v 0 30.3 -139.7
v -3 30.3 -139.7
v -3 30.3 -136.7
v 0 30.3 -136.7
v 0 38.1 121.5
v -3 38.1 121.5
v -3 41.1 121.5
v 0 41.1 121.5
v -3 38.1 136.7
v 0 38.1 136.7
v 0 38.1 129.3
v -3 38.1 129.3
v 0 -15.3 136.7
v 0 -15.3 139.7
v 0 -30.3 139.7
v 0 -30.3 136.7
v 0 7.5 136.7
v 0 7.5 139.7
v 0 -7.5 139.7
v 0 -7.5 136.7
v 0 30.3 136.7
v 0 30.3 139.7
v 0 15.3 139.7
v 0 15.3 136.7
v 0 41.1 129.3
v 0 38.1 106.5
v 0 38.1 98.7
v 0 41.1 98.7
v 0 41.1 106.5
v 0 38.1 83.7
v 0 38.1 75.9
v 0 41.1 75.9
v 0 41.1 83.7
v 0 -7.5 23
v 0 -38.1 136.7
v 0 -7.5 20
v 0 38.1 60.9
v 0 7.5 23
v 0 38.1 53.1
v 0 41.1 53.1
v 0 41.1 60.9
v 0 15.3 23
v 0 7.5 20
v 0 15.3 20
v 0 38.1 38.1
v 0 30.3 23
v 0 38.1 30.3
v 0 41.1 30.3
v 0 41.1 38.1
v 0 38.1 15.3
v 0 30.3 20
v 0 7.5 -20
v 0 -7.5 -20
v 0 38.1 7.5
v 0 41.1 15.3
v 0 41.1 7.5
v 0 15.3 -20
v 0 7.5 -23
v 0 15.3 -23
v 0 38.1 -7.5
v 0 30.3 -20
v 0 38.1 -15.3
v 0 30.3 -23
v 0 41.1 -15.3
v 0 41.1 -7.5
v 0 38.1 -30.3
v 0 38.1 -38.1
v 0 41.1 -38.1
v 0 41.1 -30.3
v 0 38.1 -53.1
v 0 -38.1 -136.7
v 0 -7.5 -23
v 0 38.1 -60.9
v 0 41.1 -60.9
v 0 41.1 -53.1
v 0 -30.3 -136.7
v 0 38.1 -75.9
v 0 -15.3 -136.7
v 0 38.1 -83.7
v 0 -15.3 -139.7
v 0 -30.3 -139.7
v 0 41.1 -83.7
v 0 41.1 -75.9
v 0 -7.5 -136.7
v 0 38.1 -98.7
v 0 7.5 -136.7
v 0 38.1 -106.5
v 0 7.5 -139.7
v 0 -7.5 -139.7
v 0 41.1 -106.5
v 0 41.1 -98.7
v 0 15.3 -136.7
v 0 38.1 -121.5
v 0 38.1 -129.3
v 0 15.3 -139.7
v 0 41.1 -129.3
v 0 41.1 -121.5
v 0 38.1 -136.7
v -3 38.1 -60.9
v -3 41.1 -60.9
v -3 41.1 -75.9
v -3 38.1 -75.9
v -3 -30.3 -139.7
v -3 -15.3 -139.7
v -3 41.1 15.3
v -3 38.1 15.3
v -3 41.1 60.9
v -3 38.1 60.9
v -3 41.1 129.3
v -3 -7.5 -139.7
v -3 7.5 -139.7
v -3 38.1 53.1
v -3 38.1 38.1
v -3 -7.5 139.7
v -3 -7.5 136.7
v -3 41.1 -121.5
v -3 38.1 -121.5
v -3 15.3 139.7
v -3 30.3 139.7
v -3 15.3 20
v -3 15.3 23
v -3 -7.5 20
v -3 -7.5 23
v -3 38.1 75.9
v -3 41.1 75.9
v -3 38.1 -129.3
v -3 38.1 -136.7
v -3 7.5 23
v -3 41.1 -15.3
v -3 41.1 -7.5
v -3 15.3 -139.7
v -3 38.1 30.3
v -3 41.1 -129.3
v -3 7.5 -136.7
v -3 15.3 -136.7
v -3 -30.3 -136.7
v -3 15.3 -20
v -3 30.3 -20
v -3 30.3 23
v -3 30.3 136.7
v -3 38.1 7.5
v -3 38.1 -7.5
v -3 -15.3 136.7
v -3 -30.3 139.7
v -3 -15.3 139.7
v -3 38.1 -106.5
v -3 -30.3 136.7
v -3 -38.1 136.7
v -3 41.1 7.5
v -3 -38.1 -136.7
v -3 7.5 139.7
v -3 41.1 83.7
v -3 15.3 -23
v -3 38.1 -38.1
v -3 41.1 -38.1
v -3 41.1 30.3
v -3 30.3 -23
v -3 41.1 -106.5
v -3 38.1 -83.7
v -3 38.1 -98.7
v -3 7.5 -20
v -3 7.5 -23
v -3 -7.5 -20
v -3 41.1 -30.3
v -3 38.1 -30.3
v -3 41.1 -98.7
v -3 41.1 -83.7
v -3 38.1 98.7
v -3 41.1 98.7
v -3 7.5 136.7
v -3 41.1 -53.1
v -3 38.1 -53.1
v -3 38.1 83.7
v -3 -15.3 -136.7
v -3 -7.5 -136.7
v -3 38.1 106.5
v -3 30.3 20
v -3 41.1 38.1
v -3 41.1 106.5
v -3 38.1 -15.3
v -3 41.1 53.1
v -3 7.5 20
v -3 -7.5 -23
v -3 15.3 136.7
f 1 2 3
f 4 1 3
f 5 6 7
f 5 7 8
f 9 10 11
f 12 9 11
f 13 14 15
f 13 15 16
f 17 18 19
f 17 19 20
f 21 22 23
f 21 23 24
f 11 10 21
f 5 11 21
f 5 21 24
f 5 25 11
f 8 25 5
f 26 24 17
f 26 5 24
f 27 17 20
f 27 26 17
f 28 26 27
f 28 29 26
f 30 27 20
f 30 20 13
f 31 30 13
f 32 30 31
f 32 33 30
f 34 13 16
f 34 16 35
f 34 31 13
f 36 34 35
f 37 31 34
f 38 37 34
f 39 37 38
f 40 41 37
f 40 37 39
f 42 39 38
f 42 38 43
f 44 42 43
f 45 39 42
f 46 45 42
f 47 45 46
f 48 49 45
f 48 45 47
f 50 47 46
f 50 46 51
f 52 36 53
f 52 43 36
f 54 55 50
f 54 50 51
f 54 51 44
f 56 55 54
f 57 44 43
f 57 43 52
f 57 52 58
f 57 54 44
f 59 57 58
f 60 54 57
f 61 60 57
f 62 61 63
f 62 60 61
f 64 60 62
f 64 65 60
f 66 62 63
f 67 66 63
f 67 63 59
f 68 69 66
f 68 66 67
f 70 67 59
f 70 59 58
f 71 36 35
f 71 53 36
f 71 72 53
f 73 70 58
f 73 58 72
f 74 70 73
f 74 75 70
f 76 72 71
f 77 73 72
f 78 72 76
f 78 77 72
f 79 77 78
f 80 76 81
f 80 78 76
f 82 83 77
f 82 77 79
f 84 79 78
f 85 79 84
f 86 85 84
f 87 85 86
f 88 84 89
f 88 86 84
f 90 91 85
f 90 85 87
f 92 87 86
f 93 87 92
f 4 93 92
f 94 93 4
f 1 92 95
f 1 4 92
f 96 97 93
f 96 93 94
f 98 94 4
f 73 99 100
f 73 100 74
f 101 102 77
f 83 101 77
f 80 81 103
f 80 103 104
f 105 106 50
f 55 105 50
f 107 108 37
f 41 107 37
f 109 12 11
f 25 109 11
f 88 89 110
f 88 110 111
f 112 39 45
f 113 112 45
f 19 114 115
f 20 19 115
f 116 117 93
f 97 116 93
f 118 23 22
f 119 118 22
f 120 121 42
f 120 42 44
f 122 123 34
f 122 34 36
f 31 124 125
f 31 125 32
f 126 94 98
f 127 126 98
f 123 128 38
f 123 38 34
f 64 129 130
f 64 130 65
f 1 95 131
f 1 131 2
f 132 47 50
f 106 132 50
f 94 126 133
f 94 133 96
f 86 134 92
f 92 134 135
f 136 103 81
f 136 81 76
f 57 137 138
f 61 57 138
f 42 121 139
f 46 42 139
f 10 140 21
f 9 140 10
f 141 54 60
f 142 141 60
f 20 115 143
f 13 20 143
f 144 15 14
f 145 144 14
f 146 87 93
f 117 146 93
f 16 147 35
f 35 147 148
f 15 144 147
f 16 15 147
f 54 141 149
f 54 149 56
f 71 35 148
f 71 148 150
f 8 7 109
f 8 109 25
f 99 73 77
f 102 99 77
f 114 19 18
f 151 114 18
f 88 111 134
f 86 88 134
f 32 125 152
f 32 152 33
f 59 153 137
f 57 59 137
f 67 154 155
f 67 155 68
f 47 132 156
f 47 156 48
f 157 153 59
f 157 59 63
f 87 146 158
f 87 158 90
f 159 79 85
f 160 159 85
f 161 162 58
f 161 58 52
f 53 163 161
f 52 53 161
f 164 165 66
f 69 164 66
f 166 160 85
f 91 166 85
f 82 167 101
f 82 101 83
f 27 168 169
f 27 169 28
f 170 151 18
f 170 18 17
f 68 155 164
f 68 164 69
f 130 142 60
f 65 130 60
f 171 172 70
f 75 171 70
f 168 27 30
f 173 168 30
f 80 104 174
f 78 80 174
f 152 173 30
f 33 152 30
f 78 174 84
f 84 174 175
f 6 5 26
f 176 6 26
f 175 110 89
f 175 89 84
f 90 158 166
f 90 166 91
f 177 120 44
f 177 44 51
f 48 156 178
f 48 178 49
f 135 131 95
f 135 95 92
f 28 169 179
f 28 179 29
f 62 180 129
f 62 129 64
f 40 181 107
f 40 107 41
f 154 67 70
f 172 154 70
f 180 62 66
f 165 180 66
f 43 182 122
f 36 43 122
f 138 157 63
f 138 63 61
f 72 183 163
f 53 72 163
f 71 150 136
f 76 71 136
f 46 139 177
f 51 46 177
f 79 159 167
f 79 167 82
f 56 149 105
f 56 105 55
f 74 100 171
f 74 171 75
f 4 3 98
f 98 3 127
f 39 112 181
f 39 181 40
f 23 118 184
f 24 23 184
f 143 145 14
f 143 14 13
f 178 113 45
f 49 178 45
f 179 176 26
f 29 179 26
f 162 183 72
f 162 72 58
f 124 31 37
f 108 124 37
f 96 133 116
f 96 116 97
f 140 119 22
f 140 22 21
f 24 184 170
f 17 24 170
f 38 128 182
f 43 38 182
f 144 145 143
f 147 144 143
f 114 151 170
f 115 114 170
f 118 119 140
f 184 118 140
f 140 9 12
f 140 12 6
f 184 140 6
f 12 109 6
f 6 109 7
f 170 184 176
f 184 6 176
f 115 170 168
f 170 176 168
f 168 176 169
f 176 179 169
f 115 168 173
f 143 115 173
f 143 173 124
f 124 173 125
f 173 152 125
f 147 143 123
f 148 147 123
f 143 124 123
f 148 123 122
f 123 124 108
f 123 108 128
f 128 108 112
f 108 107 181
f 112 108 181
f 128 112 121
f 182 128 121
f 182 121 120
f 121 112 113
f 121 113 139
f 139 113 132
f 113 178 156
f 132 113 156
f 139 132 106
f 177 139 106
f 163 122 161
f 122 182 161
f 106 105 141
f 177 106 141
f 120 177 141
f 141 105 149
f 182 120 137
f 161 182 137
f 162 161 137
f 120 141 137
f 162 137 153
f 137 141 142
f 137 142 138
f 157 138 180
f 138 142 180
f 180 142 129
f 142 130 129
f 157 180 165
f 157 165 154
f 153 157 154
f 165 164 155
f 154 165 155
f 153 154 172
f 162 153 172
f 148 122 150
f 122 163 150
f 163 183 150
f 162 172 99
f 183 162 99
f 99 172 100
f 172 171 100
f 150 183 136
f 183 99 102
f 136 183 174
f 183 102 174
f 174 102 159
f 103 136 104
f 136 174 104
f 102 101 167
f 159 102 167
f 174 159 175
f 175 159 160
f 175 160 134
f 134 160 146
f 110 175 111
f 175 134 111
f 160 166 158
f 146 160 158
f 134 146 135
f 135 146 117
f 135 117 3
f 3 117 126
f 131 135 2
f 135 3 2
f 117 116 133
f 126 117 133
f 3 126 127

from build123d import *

# Parameters (mm, degrees)
SKETCH1_W               = 279.4
SKETCH1_H               = 76.2
BOSS_EXTRUDE1_DEPTH     = 3
SKETCH3_W               = 3
SKETCH3_H               = 7.8
CUT_EXTRUDE1_DEPTH      = 145.833352512
LPATTERN1_COUNT         = 4
LPATTERN1_PITCH         = 22.8
MIRROR1_COPY_1_SKETCH_W = 3
MIRROR1_COPY_1_SKETCH_H = 7.8
MIRROR1_COPY_1_DEPTH    = 145.833352512
MIRROR1_COPY_2_SKETCH_W = 3
MIRROR1_COPY_2_SKETCH_H = 7.8
MIRROR1_COPY_2_DEPTH    = 145.833352512
MIRROR1_COPY_3_SKETCH_W = 3
MIRROR1_COPY_3_SKETCH_H = 7.8
MIRROR1_COPY_3_DEPTH    = 145.833352512
SKETCH5_W               = 3
SKETCH5_H               = 15
CUT_EXTRUDE3_DEPTH      = 10
SKETCH9_W               = 3
SKETCH9_H               = 7.8
BOSS_EXTRUDE2_DEPTH     = 3
LPATTERN4_COUNT         = 12
LPATTERN4_PITCH         = 22.8
LPATTERN5_COUNT         = 2
LPATTERN5_PITCH         = 22.8
MIRROR2_COPY_1_SKETCH_W = 3
MIRROR2_COPY_1_SKETCH_H = 15
MIRROR2_COPY_1_DEPTH    = 10


with BuildPart() as part:
    # Sketch1 → Boss-Extrude1 (new body)
    with BuildSketch(Plane(origin=(0, 0, 0), x_dir=(0, 0, -1), z_dir=(1, 0, 0))):
        Rectangle(SKETCH1_W, SKETCH1_H)
    extrude(amount=-BOSS_EXTRUDE1_DEPTH)

    # Sketch3 → Cut-Extrude1 (cut, through all)
    with BuildSketch(Plane.ZY.offset(3)):
        with Locations((-138.2, 34.2)):
            Rectangle(SKETCH3_W, SKETCH3_H)
    cut_extrude1 = extrude(amount=-CUT_EXTRUDE1_DEPTH, mode=Mode.SUBTRACT)

    # LPattern1: Cut-Extrude1 ×4
    with Locations(*[(0, -i * LPATTERN1_PITCH, 0) for i in range(1, LPATTERN1_COUNT)]):
        add(cut_extrude1, mode=Mode.SUBTRACT)

    # Mirror1: Cut-Extrude1 across plane
    add(cut_extrude1.mirror(Plane.XY), mode=Mode.SUBTRACT)

    # Mirror1 copy 1 sketch → Mirror1 copy 1 (cut, through all)
    with BuildSketch(Plane(origin=(-3, -22.8, 0), x_dir=(0, 0, -1), z_dir=(-1, 0, 0))):
        with Locations((-138.2, -34.2)):
            Rectangle(MIRROR1_COPY_1_SKETCH_W, MIRROR1_COPY_1_SKETCH_H)
    extrude(amount=-MIRROR1_COPY_1_DEPTH, mode=Mode.SUBTRACT)

    # Mirror1 copy 2 sketch → Mirror1 copy 2 (cut, through all)
    with BuildSketch(Plane(origin=(-3, -45.6, 0), x_dir=(0, 0, -1), z_dir=(-1, 0, 0))):
        with Locations((-138.2, -34.2)):
            Rectangle(MIRROR1_COPY_2_SKETCH_W, MIRROR1_COPY_2_SKETCH_H)
    extrude(amount=-MIRROR1_COPY_2_DEPTH, mode=Mode.SUBTRACT)

    # Mirror1 copy 3 sketch → Mirror1 copy 3 (cut, through all)
    with BuildSketch(Plane(origin=(-3, -68.4, 0), x_dir=(0, 0, -1), z_dir=(-1, 0, 0))):
        with Locations((-138.2, -34.2)):
            Rectangle(MIRROR1_COPY_3_SKETCH_W, MIRROR1_COPY_3_SKETCH_H)
    extrude(amount=-MIRROR1_COPY_3_DEPTH, mode=Mode.SUBTRACT)

    # Sketch5 → Cut-Extrude3 (cut)
    with BuildSketch(Plane.ZY.offset(3)):
        with Locations((-21.5, 22.8)):
            Rectangle(SKETCH5_W, SKETCH5_H)
    cut_extrude3 = extrude(amount=-CUT_EXTRUDE3_DEPTH, mode=Mode.SUBTRACT)

    # Sketch9 → Boss-Extrude2 (add)
    with BuildSketch(Plane(origin=(0, 38.1, 0), x_dir=(1, 0, 0), z_dir=(0, 1, 0))):
        with Locations((-1.5, 125.4)):
            Rectangle(SKETCH9_W, SKETCH9_H)
    boss_extrude2 = extrude(amount=BOSS_EXTRUDE2_DEPTH)

    # LPattern4: Boss-Extrude2 ×12
    with Locations(*[(0, 0, i * LPATTERN4_PITCH) for i in range(1, LPATTERN4_COUNT)]):
        add(boss_extrude2)

    # LPattern5: Cut-Extrude3 ×2
    with Locations(*[(0, -i * LPATTERN5_PITCH, 0) for i in range(1, LPATTERN5_COUNT)]):
        add(cut_extrude3, mode=Mode.SUBTRACT)

    # Mirror2: Cut-Extrude3 across plane
    add(cut_extrude3.mirror(Plane.XY), mode=Mode.SUBTRACT)

    # Mirror2 copy 1 sketch → Mirror2 copy 1 (cut)
    with BuildSketch(Plane(origin=(-3, -22.8, 0), x_dir=(0, 0, -1), z_dir=(-1, 0, 0))):
        with Locations((-21.5, -22.8)):
            Rectangle(MIRROR2_COPY_1_SKETCH_W, MIRROR2_COPY_1_SKETCH_H)
    extrude(amount=-MIRROR2_COPY_1_DEPTH, mode=Mode.SUBTRACT)


solid = part.part
